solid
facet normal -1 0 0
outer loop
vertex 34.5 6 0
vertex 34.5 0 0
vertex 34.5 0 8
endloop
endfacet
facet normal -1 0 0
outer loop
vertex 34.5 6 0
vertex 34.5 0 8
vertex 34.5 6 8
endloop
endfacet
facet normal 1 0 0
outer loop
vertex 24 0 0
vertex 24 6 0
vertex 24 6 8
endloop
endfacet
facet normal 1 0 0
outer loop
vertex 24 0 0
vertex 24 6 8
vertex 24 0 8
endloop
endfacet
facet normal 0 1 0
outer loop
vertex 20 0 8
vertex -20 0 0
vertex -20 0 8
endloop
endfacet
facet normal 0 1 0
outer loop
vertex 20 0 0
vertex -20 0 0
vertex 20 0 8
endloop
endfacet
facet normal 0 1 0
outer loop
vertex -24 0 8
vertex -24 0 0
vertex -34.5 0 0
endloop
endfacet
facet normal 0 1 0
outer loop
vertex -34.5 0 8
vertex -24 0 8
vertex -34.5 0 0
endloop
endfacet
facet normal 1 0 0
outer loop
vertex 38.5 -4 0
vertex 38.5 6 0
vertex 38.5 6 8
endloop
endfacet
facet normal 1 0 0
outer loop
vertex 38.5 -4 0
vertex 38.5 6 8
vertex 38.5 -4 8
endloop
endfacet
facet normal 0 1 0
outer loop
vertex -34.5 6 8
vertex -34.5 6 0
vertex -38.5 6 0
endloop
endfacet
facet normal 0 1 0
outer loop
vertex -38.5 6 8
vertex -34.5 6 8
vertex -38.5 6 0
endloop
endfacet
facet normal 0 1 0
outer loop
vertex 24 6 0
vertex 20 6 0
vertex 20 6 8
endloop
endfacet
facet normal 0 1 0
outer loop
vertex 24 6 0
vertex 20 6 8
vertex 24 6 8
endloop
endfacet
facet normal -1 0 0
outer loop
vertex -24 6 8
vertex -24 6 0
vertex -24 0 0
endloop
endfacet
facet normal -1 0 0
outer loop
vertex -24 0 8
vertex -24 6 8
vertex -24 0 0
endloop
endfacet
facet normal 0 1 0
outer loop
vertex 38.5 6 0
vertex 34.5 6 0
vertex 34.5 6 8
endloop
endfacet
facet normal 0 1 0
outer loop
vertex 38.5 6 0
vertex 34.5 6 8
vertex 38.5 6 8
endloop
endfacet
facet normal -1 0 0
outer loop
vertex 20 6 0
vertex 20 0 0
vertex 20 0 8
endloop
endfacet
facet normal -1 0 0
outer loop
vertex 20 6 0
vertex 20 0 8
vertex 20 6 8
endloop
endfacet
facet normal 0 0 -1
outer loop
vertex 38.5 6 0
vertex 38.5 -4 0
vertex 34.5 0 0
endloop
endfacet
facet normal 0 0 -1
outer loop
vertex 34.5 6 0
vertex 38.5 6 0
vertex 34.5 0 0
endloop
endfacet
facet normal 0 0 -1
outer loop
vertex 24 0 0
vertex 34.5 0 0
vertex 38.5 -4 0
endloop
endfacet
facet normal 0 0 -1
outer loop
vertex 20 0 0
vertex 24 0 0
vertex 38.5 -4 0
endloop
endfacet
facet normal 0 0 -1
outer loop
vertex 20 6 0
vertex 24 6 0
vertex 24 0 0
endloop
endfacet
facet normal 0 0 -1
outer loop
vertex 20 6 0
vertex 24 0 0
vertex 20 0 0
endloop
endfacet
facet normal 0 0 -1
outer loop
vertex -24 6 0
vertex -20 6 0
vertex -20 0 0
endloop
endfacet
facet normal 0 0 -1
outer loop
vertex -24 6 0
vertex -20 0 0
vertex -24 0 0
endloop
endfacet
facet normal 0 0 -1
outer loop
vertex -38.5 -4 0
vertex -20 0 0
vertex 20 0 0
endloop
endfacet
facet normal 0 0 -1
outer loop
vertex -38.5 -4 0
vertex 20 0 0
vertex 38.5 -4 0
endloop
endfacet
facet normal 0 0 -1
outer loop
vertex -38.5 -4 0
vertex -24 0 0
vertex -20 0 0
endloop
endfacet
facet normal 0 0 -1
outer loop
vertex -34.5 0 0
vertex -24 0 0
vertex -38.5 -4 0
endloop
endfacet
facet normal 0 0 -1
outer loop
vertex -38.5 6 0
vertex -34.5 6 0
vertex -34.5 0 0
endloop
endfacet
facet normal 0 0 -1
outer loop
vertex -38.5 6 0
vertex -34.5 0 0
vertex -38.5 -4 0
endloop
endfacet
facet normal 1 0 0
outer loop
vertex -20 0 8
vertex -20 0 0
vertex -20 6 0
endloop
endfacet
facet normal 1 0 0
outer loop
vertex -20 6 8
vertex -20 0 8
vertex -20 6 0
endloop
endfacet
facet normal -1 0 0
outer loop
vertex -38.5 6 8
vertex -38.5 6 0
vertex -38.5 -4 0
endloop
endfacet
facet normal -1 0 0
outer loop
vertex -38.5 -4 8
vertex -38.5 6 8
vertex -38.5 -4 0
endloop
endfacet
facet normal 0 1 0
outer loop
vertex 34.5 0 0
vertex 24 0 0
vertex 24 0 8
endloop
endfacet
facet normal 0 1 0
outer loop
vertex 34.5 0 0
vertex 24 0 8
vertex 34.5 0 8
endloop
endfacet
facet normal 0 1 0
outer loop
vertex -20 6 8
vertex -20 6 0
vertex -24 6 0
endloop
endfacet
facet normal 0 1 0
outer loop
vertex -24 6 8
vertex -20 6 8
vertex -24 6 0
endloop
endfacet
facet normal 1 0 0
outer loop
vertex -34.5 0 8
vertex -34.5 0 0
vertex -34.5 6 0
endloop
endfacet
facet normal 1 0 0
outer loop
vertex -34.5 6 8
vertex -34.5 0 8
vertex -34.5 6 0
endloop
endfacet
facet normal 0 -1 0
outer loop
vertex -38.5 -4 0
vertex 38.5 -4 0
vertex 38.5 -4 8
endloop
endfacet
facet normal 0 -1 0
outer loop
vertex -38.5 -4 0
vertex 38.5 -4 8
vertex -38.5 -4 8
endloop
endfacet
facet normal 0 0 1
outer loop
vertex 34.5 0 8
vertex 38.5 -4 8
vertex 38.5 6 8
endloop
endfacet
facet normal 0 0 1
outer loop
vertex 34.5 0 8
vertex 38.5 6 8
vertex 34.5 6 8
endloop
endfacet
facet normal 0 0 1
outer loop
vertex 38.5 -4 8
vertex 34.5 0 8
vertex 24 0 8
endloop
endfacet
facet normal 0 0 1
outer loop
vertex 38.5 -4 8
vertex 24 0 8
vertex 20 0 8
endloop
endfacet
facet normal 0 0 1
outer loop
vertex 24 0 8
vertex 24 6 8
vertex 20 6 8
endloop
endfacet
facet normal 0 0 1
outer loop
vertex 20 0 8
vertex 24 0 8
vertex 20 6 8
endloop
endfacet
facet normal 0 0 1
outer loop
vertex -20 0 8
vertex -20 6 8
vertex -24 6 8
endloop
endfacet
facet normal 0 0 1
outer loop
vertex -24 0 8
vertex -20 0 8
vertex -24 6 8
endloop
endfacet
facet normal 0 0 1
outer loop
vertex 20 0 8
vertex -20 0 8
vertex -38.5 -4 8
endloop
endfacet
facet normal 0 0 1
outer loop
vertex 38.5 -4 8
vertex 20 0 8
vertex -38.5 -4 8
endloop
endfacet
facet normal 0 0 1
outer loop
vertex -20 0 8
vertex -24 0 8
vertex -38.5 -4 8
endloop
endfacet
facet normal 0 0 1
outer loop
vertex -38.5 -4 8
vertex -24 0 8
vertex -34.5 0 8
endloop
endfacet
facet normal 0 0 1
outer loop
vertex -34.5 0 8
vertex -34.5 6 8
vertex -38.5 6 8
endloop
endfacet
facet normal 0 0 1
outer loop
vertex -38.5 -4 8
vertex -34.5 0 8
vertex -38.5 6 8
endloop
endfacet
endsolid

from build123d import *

# Parameters (mm, degrees)
BOSS_EXTRUDE2_DEPTH = 8


with BuildPart() as part:
    # Sketch1 → Boss-Extrude2 (new body)
    with BuildSketch(Plane.XY):
        Polygon((0, 0), (-20, 0), (-20, 6), (-24, 6), (-24, 0), (-34.5, 0), (-34.5, 6), (-38.5, 6), (-38.5, -4), (0, -4), align=None)
    extrude(amount=BOSS_EXTRUDE2_DEPTH)

    # Mirror1: part across plane


with BuildPart() as part_1:
    add(part.part)
    add(part.part.mirror(Plane(origin=(0, 0, 0), x_dir=(0, 0, 1), z_dir=(1, 0, 0))))


solid = part_1.part
